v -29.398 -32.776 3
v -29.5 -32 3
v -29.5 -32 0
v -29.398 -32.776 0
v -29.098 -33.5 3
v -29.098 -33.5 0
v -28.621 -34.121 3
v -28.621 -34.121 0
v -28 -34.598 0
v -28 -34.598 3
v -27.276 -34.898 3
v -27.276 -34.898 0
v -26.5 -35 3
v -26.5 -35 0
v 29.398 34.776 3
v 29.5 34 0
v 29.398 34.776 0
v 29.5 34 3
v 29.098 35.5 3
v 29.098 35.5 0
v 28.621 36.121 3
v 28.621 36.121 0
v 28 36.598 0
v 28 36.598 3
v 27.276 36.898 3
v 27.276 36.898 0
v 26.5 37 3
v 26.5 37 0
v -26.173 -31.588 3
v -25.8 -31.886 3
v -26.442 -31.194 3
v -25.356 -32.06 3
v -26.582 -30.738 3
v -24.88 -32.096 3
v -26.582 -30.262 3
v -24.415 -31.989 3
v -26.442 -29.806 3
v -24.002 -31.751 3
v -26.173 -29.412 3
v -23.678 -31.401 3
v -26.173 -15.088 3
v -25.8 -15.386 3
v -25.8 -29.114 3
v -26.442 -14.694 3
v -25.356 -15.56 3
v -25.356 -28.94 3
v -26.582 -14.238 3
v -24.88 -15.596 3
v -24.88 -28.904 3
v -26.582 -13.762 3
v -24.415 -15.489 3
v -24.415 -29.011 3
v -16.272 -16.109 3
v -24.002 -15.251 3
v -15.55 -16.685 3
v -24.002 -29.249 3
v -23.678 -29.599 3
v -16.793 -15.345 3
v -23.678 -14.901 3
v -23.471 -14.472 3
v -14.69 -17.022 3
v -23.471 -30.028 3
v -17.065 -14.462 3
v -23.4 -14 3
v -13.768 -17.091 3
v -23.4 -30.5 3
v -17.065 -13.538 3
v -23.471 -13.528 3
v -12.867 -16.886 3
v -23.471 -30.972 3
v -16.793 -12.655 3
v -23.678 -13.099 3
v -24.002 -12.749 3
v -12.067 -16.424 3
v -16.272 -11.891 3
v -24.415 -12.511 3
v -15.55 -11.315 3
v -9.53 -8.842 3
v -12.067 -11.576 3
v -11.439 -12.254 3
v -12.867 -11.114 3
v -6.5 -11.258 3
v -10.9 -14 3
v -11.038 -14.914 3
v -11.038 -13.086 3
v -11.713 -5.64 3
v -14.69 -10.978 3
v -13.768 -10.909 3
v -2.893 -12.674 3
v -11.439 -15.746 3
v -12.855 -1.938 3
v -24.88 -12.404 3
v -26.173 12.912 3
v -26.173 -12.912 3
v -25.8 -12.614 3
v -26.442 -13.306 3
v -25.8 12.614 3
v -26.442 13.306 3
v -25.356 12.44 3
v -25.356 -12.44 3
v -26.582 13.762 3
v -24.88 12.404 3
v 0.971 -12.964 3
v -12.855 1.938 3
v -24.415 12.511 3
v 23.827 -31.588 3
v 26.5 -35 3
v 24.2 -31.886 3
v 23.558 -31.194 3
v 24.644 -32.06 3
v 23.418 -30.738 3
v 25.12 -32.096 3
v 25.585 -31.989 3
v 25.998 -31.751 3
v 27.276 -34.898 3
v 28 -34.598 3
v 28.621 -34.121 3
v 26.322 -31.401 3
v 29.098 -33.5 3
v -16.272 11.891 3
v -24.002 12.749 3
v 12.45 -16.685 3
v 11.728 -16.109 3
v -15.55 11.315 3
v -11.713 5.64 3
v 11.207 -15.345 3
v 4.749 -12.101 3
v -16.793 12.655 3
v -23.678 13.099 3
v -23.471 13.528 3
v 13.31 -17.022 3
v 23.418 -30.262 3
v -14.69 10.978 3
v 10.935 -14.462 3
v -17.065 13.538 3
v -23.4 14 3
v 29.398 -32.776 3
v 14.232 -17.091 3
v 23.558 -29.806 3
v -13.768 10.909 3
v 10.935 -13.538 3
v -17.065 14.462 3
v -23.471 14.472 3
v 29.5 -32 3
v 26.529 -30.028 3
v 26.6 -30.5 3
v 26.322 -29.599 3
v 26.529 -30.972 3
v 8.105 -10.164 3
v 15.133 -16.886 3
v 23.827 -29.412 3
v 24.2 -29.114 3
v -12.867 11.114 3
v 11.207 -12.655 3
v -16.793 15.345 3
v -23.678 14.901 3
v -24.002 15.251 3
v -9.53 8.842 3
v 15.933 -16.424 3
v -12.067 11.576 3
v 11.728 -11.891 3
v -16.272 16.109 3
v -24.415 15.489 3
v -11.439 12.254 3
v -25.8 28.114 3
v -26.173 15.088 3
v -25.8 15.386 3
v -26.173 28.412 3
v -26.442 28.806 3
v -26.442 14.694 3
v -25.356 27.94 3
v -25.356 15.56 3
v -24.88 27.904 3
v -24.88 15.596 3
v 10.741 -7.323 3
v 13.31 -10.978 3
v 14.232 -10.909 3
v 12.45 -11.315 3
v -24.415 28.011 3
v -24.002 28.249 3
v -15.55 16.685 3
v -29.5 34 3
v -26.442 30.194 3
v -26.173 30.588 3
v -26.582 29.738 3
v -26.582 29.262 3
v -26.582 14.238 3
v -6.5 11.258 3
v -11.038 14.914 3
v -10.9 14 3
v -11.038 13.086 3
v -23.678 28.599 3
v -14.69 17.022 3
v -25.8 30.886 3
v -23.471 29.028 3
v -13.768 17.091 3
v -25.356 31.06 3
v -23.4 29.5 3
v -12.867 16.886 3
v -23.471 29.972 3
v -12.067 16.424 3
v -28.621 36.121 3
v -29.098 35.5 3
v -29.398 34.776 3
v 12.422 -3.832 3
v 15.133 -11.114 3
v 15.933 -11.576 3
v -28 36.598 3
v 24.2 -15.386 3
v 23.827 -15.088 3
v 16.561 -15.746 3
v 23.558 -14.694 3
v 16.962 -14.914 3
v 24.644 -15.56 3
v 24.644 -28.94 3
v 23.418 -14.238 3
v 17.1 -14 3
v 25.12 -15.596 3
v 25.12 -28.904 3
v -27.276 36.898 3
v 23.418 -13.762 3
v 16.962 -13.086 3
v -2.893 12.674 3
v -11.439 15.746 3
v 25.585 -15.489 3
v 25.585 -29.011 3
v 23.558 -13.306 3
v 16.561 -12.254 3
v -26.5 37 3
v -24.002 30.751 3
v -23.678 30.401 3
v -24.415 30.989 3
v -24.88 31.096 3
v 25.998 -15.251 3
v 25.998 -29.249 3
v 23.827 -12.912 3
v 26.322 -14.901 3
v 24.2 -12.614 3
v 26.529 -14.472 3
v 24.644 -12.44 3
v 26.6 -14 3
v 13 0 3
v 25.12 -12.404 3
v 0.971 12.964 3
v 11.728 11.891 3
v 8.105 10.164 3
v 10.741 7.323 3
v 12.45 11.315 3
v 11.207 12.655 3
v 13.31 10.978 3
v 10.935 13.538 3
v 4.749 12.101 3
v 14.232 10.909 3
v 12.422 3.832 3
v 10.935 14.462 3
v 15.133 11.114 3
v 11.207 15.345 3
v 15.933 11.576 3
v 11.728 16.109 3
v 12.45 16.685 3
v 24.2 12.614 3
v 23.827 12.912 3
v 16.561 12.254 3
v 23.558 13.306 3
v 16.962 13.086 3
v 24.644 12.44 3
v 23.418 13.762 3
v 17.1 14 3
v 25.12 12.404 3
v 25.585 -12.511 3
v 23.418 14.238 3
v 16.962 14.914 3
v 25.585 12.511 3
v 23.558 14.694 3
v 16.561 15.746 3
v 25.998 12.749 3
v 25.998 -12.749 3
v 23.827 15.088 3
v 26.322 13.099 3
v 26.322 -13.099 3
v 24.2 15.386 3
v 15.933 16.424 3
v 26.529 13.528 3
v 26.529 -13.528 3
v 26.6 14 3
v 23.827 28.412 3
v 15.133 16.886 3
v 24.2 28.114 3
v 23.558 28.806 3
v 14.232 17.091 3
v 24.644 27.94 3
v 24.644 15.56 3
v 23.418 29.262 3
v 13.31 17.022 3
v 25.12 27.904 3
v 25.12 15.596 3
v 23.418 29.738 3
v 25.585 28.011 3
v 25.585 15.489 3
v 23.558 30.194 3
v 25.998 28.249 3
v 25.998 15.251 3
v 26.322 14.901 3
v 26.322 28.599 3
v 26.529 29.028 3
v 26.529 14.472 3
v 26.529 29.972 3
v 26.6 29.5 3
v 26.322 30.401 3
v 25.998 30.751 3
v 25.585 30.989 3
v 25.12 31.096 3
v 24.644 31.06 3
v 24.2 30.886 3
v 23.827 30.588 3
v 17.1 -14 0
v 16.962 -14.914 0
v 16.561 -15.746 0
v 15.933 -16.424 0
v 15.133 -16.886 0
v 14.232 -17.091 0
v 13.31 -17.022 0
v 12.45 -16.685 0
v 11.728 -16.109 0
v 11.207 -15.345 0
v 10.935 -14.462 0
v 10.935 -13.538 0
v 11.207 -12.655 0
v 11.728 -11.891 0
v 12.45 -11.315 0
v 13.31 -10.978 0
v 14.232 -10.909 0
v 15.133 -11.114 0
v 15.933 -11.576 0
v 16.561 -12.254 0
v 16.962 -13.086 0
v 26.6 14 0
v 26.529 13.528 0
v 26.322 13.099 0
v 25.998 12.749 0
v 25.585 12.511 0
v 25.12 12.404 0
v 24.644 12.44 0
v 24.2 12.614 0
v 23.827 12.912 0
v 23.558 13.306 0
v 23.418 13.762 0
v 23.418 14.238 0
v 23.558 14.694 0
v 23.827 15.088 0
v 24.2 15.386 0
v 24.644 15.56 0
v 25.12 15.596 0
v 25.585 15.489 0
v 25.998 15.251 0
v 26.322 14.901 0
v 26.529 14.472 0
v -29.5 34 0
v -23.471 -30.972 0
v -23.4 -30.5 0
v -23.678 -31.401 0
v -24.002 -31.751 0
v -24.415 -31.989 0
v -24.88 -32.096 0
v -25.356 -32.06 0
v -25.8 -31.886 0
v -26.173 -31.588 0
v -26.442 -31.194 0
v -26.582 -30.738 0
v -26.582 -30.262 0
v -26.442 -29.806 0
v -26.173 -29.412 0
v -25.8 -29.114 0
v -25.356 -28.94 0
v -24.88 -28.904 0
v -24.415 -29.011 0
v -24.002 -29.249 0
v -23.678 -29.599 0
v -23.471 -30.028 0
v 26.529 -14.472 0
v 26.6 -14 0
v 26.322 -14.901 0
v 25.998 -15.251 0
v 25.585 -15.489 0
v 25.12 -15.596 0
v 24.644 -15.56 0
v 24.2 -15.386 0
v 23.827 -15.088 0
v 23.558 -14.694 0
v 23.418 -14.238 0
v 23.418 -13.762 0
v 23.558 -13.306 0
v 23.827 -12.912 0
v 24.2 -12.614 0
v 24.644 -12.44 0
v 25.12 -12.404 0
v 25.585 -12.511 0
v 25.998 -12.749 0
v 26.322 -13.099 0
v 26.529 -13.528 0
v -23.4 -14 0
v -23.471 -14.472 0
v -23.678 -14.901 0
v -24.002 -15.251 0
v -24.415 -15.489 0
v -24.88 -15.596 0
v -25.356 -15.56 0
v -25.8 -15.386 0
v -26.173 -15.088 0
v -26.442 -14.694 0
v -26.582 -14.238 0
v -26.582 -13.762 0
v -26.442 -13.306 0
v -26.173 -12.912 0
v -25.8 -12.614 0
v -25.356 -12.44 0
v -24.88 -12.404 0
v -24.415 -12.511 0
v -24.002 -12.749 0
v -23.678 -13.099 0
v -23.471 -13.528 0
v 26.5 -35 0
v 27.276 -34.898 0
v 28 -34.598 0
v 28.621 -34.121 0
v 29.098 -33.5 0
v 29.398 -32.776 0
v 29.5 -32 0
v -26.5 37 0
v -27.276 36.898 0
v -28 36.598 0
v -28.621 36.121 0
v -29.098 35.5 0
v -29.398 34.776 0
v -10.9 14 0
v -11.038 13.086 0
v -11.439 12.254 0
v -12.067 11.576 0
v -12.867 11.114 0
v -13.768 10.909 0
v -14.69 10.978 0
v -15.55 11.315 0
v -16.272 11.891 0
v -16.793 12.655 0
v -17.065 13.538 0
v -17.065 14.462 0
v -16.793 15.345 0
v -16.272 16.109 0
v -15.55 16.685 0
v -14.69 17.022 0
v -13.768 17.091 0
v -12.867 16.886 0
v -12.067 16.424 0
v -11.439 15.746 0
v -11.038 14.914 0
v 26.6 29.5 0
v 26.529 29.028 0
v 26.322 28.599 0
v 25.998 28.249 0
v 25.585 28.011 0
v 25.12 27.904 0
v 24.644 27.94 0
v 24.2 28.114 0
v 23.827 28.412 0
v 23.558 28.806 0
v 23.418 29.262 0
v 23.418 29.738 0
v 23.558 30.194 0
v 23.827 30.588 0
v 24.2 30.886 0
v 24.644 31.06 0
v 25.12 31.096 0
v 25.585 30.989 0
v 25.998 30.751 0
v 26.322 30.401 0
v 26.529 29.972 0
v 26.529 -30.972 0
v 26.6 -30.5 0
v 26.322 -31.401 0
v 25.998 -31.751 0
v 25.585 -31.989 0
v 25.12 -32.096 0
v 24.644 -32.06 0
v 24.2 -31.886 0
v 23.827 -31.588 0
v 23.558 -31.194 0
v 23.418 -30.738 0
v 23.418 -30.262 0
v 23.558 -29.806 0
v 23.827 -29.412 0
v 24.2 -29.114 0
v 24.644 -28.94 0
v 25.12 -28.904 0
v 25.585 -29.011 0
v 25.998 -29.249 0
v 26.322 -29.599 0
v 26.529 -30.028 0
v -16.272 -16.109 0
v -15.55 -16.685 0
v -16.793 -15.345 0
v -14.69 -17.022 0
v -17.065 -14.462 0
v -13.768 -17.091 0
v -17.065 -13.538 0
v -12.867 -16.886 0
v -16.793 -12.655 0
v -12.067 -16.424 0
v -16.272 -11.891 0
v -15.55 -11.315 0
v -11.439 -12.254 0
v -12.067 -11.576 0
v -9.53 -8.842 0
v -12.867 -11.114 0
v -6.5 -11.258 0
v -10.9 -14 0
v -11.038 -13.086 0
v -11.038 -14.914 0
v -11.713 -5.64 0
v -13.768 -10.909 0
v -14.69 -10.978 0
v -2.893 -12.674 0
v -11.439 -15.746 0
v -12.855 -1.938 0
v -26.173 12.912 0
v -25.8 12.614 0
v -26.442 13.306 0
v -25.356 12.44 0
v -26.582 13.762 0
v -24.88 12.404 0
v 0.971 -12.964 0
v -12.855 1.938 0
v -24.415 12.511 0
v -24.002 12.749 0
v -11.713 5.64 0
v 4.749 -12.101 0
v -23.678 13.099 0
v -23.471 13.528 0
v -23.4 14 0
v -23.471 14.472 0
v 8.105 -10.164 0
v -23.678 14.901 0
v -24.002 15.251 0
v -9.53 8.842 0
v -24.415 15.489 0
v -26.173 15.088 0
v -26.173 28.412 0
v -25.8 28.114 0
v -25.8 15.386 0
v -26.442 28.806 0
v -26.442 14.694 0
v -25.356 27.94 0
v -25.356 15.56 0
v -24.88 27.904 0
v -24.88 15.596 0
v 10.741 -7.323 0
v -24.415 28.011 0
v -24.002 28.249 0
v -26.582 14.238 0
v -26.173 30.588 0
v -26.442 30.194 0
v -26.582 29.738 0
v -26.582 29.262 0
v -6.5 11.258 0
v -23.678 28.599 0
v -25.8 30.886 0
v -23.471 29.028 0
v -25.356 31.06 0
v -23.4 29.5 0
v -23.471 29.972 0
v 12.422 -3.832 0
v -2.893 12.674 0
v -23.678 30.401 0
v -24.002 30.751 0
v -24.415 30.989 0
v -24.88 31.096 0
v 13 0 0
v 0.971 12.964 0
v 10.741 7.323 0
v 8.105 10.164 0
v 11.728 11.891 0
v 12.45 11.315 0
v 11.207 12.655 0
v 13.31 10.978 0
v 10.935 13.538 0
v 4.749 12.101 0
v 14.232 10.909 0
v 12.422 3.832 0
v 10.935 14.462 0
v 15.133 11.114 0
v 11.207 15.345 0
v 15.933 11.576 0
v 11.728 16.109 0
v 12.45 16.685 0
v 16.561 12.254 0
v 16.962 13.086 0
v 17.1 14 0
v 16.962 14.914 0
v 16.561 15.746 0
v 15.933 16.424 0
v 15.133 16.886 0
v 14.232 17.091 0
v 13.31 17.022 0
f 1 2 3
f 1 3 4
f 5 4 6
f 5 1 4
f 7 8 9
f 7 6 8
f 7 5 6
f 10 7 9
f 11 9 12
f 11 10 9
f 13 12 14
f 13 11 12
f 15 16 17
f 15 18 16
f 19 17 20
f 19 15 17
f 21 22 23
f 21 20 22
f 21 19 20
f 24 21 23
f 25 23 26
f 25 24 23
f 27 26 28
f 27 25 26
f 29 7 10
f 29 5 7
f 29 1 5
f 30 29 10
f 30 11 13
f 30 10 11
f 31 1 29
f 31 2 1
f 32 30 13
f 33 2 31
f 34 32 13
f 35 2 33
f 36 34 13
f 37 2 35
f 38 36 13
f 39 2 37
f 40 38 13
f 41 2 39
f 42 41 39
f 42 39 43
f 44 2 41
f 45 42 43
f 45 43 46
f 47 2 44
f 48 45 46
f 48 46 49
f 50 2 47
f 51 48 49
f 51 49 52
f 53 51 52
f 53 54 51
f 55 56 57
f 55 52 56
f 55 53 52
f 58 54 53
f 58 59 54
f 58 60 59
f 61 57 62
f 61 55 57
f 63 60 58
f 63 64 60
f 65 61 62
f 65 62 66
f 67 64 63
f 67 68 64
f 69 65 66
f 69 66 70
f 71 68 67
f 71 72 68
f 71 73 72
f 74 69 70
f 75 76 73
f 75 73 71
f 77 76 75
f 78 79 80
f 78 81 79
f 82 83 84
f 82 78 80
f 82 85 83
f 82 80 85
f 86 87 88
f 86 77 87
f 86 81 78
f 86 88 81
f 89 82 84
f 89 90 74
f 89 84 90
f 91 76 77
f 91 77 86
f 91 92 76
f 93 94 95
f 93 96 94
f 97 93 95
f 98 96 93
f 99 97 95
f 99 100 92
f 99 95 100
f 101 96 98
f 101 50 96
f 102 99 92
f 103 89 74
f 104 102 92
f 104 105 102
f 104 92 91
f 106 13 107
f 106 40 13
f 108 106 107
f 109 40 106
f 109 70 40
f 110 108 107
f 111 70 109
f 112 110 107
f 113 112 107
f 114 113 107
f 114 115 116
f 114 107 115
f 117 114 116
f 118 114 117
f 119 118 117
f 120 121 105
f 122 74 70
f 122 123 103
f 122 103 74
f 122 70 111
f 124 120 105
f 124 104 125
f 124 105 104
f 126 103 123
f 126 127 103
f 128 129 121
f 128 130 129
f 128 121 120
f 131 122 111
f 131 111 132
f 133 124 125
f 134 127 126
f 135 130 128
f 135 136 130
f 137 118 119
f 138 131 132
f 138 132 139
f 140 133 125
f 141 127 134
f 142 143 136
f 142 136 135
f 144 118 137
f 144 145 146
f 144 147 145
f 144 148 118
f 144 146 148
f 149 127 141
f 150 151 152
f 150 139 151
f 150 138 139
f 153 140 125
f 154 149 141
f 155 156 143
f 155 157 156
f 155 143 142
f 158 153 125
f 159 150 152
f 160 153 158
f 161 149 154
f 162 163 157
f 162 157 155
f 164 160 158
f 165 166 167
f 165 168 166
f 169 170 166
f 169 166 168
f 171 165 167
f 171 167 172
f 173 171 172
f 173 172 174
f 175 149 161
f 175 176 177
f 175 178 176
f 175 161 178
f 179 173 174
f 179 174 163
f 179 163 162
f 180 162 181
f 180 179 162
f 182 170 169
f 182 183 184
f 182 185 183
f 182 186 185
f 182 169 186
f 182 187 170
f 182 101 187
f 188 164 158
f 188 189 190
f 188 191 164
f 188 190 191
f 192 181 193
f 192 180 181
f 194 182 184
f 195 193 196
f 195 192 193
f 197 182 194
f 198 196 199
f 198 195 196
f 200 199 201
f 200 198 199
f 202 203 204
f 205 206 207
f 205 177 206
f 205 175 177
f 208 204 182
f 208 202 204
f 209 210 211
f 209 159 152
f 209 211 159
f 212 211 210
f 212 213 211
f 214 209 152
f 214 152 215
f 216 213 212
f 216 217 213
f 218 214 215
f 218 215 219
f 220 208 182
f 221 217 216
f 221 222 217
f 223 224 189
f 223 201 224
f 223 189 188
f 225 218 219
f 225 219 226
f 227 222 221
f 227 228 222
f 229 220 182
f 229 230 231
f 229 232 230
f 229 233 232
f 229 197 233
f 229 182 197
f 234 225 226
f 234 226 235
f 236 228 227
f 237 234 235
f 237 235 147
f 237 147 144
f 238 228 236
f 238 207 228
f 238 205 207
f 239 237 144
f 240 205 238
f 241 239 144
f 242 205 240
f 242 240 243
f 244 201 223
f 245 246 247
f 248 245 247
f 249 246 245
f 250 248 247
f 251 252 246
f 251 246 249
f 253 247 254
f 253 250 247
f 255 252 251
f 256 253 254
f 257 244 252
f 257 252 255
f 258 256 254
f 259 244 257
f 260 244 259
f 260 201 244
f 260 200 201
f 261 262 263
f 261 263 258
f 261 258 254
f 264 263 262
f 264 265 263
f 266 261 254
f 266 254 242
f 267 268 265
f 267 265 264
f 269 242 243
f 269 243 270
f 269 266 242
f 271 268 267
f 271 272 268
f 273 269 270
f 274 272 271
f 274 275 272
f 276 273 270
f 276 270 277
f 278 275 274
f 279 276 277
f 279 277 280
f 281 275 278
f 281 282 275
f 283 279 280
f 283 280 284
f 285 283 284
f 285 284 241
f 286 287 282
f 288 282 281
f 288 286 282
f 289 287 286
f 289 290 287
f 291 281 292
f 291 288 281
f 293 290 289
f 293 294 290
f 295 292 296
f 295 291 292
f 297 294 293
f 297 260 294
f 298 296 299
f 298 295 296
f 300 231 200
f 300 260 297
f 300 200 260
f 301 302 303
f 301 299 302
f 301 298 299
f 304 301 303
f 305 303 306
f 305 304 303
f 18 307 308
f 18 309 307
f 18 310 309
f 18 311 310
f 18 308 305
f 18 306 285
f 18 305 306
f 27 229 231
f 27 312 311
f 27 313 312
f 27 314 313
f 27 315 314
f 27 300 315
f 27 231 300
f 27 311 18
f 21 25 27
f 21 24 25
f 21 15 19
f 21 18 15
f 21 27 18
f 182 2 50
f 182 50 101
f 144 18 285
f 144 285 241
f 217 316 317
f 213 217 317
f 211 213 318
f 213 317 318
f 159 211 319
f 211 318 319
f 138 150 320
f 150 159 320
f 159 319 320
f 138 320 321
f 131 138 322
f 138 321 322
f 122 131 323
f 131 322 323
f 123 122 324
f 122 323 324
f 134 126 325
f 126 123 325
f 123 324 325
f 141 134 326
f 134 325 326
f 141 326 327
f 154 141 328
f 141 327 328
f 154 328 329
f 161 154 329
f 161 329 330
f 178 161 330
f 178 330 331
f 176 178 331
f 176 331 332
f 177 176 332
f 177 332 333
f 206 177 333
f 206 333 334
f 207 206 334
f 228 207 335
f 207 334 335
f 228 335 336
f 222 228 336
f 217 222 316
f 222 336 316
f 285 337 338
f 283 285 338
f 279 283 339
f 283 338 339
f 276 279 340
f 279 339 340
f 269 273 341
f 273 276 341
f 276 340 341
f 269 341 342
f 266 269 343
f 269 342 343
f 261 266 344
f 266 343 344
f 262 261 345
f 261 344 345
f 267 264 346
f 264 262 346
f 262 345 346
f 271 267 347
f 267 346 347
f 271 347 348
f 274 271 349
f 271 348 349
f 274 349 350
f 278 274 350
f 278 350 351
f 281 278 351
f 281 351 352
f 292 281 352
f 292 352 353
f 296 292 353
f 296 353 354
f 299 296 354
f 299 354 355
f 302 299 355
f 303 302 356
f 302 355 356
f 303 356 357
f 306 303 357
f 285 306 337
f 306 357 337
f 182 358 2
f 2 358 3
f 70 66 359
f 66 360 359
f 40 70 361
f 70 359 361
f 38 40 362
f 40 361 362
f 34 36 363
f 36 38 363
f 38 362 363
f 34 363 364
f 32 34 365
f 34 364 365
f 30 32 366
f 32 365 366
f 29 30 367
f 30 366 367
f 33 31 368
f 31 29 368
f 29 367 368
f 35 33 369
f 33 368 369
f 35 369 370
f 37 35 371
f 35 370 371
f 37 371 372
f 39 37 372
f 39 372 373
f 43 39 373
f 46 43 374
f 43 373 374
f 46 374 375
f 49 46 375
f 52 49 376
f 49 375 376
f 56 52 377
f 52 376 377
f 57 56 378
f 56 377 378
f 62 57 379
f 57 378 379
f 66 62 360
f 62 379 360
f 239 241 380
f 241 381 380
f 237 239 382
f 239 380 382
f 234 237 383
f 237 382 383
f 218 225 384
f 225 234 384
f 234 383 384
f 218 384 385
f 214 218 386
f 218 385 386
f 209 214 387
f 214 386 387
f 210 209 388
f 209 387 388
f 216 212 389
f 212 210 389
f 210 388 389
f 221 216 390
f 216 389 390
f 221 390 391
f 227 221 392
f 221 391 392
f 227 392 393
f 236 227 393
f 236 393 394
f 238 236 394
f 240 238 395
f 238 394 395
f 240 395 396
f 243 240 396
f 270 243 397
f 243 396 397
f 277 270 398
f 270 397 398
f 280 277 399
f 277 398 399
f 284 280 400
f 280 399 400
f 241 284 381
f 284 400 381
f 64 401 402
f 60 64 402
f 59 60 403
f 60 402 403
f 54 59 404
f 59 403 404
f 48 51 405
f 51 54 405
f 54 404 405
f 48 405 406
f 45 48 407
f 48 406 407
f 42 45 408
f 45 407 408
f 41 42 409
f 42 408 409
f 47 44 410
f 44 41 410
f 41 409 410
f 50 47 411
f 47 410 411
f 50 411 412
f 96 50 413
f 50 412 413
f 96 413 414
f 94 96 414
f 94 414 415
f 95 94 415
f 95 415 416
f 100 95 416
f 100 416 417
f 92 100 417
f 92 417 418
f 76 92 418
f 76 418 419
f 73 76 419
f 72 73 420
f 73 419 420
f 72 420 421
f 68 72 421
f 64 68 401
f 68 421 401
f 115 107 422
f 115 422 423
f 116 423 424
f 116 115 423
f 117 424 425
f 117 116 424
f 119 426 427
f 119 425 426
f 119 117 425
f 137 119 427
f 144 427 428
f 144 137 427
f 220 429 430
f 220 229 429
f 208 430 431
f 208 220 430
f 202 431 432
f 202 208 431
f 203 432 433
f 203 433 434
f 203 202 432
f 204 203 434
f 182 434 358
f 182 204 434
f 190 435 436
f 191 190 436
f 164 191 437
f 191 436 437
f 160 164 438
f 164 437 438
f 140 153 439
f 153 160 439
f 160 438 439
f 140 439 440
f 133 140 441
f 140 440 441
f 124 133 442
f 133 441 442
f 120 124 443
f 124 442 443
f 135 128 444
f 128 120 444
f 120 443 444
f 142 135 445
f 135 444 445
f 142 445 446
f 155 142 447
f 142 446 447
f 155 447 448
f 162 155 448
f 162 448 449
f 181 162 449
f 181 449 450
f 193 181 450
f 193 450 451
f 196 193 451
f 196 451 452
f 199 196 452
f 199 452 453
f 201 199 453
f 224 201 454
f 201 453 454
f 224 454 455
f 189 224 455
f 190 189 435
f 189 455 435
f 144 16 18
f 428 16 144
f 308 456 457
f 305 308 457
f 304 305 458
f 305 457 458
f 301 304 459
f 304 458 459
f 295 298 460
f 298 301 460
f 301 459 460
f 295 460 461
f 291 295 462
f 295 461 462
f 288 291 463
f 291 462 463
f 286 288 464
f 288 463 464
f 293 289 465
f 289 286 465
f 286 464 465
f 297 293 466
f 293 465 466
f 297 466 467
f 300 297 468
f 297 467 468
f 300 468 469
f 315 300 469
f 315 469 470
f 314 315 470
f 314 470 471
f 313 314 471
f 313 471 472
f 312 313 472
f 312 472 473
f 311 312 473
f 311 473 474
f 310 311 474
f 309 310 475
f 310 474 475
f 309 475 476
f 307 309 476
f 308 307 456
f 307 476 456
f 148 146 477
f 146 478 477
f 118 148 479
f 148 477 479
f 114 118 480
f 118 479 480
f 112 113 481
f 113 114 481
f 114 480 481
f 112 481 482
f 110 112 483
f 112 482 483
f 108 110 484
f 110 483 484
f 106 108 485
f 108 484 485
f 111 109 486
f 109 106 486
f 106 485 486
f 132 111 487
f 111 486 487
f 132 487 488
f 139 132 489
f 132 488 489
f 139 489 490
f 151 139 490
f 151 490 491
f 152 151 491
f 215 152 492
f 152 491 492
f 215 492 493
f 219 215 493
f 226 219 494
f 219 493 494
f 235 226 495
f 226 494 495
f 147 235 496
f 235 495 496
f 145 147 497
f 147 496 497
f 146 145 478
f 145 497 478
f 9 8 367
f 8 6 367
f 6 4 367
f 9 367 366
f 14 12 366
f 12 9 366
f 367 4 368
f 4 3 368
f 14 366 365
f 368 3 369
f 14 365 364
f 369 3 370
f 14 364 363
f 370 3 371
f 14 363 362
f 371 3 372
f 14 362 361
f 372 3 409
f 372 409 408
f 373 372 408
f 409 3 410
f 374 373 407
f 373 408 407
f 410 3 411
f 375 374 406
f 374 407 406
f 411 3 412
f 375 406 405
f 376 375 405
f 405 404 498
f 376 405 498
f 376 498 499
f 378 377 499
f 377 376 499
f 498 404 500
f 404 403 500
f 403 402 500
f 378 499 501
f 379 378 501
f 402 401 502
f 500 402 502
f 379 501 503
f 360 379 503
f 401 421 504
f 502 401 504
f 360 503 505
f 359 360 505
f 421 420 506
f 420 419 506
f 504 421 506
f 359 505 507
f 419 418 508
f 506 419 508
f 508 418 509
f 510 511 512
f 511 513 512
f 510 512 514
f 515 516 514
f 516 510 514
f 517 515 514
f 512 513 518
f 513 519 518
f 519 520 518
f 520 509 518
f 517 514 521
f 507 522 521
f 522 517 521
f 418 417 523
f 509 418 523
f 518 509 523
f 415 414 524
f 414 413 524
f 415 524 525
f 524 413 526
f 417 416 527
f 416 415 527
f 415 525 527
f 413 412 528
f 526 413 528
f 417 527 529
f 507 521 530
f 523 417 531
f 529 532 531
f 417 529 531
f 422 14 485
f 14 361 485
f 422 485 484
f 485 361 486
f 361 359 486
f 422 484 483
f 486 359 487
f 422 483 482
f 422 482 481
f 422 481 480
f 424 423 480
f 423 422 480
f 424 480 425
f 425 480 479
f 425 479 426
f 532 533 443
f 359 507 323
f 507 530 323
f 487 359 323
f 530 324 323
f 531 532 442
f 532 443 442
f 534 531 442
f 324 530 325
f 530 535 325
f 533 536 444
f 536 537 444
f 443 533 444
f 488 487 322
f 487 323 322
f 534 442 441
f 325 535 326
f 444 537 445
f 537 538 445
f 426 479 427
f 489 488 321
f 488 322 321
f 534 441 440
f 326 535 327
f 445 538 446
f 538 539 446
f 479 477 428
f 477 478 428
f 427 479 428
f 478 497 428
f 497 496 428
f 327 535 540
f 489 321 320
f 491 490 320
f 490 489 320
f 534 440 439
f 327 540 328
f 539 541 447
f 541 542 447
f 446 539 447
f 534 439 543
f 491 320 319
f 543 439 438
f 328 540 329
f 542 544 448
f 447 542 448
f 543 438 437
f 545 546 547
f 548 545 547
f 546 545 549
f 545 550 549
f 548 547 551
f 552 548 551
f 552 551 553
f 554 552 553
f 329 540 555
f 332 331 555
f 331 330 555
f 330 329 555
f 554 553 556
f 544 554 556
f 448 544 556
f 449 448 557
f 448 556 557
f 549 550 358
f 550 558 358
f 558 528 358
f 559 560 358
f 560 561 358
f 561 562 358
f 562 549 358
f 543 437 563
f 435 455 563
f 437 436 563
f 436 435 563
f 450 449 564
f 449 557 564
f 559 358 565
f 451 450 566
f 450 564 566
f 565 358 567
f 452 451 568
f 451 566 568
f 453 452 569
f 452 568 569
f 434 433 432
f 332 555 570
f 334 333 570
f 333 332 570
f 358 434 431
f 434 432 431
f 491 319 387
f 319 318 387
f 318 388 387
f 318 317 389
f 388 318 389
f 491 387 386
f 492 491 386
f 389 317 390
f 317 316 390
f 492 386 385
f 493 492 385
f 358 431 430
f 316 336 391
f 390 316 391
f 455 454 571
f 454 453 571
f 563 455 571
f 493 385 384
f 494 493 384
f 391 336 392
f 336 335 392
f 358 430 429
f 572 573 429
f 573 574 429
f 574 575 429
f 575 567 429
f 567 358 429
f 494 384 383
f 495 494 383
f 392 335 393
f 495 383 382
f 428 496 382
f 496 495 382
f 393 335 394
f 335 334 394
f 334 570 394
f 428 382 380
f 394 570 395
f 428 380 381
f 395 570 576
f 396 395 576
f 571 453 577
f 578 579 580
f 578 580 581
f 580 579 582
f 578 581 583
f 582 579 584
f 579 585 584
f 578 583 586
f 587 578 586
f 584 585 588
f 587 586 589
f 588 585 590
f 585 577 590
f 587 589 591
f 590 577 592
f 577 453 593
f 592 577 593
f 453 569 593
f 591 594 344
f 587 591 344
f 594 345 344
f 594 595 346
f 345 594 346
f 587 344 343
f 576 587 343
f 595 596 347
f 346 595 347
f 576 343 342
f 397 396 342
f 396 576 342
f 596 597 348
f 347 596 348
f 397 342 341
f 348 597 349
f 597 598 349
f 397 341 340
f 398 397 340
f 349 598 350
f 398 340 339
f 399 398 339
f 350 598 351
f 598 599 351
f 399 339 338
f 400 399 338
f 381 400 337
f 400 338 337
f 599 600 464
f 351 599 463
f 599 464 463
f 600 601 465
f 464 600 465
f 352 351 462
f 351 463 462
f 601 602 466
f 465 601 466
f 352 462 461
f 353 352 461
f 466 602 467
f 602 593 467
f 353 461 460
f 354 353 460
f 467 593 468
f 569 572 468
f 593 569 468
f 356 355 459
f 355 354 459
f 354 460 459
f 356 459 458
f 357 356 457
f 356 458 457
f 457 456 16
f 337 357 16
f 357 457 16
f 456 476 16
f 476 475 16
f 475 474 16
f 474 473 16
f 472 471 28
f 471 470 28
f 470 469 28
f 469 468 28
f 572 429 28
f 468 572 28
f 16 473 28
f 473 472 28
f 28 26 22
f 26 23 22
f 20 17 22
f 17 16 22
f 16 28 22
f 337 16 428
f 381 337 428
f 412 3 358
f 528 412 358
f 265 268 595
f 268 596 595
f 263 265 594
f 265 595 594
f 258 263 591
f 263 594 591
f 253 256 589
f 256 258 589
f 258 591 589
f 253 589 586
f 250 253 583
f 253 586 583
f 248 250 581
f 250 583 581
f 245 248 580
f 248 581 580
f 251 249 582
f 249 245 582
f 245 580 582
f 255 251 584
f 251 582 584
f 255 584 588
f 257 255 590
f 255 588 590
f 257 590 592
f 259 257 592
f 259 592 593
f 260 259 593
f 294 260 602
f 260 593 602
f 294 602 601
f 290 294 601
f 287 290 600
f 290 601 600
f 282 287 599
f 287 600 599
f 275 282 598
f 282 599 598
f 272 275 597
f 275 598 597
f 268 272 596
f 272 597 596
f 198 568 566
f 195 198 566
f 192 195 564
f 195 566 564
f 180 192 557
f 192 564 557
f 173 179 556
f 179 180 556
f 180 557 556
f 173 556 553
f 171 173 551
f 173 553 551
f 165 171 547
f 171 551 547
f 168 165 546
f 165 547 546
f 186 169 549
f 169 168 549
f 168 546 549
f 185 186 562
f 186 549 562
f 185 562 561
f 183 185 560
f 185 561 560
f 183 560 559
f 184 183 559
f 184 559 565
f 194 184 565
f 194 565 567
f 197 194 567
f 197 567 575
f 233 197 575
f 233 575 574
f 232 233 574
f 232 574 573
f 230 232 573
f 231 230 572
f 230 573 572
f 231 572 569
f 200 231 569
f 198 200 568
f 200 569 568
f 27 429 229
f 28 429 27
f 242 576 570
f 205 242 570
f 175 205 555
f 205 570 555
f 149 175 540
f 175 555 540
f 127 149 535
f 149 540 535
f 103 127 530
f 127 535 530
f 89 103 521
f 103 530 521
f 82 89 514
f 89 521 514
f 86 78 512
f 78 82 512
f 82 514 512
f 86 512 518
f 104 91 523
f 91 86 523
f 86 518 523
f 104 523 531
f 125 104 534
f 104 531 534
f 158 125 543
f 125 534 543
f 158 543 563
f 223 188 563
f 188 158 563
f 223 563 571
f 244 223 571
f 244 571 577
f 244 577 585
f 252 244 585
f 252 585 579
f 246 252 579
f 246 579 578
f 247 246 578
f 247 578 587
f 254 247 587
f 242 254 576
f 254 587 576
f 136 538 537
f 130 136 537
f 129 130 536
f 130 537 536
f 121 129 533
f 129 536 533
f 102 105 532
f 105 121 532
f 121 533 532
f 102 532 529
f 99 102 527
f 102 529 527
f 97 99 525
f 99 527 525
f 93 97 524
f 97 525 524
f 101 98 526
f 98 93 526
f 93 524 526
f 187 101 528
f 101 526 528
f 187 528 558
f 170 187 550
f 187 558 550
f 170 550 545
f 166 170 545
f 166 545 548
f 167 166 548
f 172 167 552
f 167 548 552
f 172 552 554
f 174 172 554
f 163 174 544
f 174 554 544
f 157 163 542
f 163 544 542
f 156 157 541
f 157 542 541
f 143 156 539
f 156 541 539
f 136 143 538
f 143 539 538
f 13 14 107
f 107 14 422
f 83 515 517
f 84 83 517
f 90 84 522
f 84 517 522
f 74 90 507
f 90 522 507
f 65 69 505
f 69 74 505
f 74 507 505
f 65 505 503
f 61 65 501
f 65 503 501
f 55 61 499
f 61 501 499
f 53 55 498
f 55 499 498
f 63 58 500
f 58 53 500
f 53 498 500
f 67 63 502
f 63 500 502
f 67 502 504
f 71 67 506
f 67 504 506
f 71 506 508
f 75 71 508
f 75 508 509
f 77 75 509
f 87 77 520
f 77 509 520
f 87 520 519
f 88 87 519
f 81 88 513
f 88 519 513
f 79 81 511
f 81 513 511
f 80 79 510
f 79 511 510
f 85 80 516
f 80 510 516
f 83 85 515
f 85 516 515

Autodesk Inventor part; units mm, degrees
ref_plane "YZ Plane" through (0, 0, 0) normal (1, 0, 0) x (0, 1, 0)
ref_plane "XZ Plane" through (0, 0, 0) normal (0, 1, 0) x (-1, 0, 0)
ref_plane "XY Plane" through (0, 0, 0) normal (0, 0, 1) x (1, 0, 0)
sketch "スケッチ1" plane through (0, 0, 0) normal (0, 0, 1) x (1, 0, 0)
  circle A0 centre (0, 0) radius 13
  circle A1 centre (-14, 14) radius 3.1
  circle A2 centre (14, 14) radius 3.1
  circle A3 centre (-14, -14) radius 3.1
  circle A4 centre (14, -14) radius 3.1
  line L0 (20, 20) -> (-20, 20) construction
  line L1 (-20, 20) -> (-20, -20) construction
  line L2 (-20, -20) -> (20, -20) construction
  line L3 (20, -20) -> (20, 20) construction
  line L4 (20, 20) -> (-20, -20) construction
  line L5 (-20, 20) -> (20, -20) construction
  circle A5 centre (-25, 14) radius 1.6
  circle A6 centre (-25, -14) radius 1.6
  circle A7 centre (25, 14) radius 1.6
  circle A8 centre (25, -14) radius 1.6
  line L6 (-47.387, 37) -> (51.5127, 37) construction
  line L7 (51.5127, 37) -> (51.5127, 22) construction
  line L8 (51.5127, 22) -> (-47.387, 22) construction
  line L9 (-47.387, 22) -> (-47.387, 37) construction
  circle A9 centre (-25, 29.5) radius 1.6
  circle A10 centre (25, 29.5) radius 1.6
  circle A11 centre (-25, -30.5) radius 1.6
  circle A12 centre (25, -30.5) radius 1.6
  line L10 (-36.8919, -26) -> (36.9631, -26) construction
  line L11 (36.9631, -26) -> (36.9631, -35) construction
  line L12 (36.9631, -35) -> (-36.8919, -35) construction
  line L13 (-36.8919, -35) -> (-36.8919, -26) construction
  line L14 (-29.5, 37) -> (-29.5, -35)
  line L15 (-29.5, 37) -> (29.5, 37)
  line L16 (29.5, 37) -> (29.5, -35)
  line L17 (-29.5, -35) -> (29.5, -35)
  dimension "d0" = 26
  dimension "d1" = 6.2
  dimension "d2" = 6.2
  dimension "d3" = 6.2
  dimension "d4" = 6.2
  dimension "d5" = 28
  dimension "d6" = 28
  dimension "d7" = 14
  dimension "d8" = 14
  dimension "d9" = 40
  dimension "d10" = 40
  dimension "d11" = 3.2
  dimension "d12" = 3.2
  dimension "d13" = 3.2
  dimension "d14" = 3.2
  dimension "d15" = 15
  dimension "d16" = 2
  dimension "d17" = 5
  dimension "d18" = 5
  dimension "d19" = 3.2
  dimension "d20" = 3.2
  dimension "d21" = 7.5
  dimension "d22" = 3.2
  dimension "d23" = 3.2
  dimension "d26" = 9
  dimension "d27" = 4.5
  dimension "d28" = 63
  dimension "d29" = 4.5
  dimension "d30" = 4.5
extrude "押し出し1" add sketch "スケッチ1" along normal blind 3
fillet "フィレット1" radius 3 4 edges at (-29.5, 37, 1.5) (29.5, 37, 1.5) (29.5, -35, 1.5) (-29.5, -35, 1.5)
equation "\"d7\" = 0.5 * d5"
equation "\"d8\" = 0.5 * d6"
properties part number "ハンド_シリンダ固定板" material "アルミニウム 6061"
